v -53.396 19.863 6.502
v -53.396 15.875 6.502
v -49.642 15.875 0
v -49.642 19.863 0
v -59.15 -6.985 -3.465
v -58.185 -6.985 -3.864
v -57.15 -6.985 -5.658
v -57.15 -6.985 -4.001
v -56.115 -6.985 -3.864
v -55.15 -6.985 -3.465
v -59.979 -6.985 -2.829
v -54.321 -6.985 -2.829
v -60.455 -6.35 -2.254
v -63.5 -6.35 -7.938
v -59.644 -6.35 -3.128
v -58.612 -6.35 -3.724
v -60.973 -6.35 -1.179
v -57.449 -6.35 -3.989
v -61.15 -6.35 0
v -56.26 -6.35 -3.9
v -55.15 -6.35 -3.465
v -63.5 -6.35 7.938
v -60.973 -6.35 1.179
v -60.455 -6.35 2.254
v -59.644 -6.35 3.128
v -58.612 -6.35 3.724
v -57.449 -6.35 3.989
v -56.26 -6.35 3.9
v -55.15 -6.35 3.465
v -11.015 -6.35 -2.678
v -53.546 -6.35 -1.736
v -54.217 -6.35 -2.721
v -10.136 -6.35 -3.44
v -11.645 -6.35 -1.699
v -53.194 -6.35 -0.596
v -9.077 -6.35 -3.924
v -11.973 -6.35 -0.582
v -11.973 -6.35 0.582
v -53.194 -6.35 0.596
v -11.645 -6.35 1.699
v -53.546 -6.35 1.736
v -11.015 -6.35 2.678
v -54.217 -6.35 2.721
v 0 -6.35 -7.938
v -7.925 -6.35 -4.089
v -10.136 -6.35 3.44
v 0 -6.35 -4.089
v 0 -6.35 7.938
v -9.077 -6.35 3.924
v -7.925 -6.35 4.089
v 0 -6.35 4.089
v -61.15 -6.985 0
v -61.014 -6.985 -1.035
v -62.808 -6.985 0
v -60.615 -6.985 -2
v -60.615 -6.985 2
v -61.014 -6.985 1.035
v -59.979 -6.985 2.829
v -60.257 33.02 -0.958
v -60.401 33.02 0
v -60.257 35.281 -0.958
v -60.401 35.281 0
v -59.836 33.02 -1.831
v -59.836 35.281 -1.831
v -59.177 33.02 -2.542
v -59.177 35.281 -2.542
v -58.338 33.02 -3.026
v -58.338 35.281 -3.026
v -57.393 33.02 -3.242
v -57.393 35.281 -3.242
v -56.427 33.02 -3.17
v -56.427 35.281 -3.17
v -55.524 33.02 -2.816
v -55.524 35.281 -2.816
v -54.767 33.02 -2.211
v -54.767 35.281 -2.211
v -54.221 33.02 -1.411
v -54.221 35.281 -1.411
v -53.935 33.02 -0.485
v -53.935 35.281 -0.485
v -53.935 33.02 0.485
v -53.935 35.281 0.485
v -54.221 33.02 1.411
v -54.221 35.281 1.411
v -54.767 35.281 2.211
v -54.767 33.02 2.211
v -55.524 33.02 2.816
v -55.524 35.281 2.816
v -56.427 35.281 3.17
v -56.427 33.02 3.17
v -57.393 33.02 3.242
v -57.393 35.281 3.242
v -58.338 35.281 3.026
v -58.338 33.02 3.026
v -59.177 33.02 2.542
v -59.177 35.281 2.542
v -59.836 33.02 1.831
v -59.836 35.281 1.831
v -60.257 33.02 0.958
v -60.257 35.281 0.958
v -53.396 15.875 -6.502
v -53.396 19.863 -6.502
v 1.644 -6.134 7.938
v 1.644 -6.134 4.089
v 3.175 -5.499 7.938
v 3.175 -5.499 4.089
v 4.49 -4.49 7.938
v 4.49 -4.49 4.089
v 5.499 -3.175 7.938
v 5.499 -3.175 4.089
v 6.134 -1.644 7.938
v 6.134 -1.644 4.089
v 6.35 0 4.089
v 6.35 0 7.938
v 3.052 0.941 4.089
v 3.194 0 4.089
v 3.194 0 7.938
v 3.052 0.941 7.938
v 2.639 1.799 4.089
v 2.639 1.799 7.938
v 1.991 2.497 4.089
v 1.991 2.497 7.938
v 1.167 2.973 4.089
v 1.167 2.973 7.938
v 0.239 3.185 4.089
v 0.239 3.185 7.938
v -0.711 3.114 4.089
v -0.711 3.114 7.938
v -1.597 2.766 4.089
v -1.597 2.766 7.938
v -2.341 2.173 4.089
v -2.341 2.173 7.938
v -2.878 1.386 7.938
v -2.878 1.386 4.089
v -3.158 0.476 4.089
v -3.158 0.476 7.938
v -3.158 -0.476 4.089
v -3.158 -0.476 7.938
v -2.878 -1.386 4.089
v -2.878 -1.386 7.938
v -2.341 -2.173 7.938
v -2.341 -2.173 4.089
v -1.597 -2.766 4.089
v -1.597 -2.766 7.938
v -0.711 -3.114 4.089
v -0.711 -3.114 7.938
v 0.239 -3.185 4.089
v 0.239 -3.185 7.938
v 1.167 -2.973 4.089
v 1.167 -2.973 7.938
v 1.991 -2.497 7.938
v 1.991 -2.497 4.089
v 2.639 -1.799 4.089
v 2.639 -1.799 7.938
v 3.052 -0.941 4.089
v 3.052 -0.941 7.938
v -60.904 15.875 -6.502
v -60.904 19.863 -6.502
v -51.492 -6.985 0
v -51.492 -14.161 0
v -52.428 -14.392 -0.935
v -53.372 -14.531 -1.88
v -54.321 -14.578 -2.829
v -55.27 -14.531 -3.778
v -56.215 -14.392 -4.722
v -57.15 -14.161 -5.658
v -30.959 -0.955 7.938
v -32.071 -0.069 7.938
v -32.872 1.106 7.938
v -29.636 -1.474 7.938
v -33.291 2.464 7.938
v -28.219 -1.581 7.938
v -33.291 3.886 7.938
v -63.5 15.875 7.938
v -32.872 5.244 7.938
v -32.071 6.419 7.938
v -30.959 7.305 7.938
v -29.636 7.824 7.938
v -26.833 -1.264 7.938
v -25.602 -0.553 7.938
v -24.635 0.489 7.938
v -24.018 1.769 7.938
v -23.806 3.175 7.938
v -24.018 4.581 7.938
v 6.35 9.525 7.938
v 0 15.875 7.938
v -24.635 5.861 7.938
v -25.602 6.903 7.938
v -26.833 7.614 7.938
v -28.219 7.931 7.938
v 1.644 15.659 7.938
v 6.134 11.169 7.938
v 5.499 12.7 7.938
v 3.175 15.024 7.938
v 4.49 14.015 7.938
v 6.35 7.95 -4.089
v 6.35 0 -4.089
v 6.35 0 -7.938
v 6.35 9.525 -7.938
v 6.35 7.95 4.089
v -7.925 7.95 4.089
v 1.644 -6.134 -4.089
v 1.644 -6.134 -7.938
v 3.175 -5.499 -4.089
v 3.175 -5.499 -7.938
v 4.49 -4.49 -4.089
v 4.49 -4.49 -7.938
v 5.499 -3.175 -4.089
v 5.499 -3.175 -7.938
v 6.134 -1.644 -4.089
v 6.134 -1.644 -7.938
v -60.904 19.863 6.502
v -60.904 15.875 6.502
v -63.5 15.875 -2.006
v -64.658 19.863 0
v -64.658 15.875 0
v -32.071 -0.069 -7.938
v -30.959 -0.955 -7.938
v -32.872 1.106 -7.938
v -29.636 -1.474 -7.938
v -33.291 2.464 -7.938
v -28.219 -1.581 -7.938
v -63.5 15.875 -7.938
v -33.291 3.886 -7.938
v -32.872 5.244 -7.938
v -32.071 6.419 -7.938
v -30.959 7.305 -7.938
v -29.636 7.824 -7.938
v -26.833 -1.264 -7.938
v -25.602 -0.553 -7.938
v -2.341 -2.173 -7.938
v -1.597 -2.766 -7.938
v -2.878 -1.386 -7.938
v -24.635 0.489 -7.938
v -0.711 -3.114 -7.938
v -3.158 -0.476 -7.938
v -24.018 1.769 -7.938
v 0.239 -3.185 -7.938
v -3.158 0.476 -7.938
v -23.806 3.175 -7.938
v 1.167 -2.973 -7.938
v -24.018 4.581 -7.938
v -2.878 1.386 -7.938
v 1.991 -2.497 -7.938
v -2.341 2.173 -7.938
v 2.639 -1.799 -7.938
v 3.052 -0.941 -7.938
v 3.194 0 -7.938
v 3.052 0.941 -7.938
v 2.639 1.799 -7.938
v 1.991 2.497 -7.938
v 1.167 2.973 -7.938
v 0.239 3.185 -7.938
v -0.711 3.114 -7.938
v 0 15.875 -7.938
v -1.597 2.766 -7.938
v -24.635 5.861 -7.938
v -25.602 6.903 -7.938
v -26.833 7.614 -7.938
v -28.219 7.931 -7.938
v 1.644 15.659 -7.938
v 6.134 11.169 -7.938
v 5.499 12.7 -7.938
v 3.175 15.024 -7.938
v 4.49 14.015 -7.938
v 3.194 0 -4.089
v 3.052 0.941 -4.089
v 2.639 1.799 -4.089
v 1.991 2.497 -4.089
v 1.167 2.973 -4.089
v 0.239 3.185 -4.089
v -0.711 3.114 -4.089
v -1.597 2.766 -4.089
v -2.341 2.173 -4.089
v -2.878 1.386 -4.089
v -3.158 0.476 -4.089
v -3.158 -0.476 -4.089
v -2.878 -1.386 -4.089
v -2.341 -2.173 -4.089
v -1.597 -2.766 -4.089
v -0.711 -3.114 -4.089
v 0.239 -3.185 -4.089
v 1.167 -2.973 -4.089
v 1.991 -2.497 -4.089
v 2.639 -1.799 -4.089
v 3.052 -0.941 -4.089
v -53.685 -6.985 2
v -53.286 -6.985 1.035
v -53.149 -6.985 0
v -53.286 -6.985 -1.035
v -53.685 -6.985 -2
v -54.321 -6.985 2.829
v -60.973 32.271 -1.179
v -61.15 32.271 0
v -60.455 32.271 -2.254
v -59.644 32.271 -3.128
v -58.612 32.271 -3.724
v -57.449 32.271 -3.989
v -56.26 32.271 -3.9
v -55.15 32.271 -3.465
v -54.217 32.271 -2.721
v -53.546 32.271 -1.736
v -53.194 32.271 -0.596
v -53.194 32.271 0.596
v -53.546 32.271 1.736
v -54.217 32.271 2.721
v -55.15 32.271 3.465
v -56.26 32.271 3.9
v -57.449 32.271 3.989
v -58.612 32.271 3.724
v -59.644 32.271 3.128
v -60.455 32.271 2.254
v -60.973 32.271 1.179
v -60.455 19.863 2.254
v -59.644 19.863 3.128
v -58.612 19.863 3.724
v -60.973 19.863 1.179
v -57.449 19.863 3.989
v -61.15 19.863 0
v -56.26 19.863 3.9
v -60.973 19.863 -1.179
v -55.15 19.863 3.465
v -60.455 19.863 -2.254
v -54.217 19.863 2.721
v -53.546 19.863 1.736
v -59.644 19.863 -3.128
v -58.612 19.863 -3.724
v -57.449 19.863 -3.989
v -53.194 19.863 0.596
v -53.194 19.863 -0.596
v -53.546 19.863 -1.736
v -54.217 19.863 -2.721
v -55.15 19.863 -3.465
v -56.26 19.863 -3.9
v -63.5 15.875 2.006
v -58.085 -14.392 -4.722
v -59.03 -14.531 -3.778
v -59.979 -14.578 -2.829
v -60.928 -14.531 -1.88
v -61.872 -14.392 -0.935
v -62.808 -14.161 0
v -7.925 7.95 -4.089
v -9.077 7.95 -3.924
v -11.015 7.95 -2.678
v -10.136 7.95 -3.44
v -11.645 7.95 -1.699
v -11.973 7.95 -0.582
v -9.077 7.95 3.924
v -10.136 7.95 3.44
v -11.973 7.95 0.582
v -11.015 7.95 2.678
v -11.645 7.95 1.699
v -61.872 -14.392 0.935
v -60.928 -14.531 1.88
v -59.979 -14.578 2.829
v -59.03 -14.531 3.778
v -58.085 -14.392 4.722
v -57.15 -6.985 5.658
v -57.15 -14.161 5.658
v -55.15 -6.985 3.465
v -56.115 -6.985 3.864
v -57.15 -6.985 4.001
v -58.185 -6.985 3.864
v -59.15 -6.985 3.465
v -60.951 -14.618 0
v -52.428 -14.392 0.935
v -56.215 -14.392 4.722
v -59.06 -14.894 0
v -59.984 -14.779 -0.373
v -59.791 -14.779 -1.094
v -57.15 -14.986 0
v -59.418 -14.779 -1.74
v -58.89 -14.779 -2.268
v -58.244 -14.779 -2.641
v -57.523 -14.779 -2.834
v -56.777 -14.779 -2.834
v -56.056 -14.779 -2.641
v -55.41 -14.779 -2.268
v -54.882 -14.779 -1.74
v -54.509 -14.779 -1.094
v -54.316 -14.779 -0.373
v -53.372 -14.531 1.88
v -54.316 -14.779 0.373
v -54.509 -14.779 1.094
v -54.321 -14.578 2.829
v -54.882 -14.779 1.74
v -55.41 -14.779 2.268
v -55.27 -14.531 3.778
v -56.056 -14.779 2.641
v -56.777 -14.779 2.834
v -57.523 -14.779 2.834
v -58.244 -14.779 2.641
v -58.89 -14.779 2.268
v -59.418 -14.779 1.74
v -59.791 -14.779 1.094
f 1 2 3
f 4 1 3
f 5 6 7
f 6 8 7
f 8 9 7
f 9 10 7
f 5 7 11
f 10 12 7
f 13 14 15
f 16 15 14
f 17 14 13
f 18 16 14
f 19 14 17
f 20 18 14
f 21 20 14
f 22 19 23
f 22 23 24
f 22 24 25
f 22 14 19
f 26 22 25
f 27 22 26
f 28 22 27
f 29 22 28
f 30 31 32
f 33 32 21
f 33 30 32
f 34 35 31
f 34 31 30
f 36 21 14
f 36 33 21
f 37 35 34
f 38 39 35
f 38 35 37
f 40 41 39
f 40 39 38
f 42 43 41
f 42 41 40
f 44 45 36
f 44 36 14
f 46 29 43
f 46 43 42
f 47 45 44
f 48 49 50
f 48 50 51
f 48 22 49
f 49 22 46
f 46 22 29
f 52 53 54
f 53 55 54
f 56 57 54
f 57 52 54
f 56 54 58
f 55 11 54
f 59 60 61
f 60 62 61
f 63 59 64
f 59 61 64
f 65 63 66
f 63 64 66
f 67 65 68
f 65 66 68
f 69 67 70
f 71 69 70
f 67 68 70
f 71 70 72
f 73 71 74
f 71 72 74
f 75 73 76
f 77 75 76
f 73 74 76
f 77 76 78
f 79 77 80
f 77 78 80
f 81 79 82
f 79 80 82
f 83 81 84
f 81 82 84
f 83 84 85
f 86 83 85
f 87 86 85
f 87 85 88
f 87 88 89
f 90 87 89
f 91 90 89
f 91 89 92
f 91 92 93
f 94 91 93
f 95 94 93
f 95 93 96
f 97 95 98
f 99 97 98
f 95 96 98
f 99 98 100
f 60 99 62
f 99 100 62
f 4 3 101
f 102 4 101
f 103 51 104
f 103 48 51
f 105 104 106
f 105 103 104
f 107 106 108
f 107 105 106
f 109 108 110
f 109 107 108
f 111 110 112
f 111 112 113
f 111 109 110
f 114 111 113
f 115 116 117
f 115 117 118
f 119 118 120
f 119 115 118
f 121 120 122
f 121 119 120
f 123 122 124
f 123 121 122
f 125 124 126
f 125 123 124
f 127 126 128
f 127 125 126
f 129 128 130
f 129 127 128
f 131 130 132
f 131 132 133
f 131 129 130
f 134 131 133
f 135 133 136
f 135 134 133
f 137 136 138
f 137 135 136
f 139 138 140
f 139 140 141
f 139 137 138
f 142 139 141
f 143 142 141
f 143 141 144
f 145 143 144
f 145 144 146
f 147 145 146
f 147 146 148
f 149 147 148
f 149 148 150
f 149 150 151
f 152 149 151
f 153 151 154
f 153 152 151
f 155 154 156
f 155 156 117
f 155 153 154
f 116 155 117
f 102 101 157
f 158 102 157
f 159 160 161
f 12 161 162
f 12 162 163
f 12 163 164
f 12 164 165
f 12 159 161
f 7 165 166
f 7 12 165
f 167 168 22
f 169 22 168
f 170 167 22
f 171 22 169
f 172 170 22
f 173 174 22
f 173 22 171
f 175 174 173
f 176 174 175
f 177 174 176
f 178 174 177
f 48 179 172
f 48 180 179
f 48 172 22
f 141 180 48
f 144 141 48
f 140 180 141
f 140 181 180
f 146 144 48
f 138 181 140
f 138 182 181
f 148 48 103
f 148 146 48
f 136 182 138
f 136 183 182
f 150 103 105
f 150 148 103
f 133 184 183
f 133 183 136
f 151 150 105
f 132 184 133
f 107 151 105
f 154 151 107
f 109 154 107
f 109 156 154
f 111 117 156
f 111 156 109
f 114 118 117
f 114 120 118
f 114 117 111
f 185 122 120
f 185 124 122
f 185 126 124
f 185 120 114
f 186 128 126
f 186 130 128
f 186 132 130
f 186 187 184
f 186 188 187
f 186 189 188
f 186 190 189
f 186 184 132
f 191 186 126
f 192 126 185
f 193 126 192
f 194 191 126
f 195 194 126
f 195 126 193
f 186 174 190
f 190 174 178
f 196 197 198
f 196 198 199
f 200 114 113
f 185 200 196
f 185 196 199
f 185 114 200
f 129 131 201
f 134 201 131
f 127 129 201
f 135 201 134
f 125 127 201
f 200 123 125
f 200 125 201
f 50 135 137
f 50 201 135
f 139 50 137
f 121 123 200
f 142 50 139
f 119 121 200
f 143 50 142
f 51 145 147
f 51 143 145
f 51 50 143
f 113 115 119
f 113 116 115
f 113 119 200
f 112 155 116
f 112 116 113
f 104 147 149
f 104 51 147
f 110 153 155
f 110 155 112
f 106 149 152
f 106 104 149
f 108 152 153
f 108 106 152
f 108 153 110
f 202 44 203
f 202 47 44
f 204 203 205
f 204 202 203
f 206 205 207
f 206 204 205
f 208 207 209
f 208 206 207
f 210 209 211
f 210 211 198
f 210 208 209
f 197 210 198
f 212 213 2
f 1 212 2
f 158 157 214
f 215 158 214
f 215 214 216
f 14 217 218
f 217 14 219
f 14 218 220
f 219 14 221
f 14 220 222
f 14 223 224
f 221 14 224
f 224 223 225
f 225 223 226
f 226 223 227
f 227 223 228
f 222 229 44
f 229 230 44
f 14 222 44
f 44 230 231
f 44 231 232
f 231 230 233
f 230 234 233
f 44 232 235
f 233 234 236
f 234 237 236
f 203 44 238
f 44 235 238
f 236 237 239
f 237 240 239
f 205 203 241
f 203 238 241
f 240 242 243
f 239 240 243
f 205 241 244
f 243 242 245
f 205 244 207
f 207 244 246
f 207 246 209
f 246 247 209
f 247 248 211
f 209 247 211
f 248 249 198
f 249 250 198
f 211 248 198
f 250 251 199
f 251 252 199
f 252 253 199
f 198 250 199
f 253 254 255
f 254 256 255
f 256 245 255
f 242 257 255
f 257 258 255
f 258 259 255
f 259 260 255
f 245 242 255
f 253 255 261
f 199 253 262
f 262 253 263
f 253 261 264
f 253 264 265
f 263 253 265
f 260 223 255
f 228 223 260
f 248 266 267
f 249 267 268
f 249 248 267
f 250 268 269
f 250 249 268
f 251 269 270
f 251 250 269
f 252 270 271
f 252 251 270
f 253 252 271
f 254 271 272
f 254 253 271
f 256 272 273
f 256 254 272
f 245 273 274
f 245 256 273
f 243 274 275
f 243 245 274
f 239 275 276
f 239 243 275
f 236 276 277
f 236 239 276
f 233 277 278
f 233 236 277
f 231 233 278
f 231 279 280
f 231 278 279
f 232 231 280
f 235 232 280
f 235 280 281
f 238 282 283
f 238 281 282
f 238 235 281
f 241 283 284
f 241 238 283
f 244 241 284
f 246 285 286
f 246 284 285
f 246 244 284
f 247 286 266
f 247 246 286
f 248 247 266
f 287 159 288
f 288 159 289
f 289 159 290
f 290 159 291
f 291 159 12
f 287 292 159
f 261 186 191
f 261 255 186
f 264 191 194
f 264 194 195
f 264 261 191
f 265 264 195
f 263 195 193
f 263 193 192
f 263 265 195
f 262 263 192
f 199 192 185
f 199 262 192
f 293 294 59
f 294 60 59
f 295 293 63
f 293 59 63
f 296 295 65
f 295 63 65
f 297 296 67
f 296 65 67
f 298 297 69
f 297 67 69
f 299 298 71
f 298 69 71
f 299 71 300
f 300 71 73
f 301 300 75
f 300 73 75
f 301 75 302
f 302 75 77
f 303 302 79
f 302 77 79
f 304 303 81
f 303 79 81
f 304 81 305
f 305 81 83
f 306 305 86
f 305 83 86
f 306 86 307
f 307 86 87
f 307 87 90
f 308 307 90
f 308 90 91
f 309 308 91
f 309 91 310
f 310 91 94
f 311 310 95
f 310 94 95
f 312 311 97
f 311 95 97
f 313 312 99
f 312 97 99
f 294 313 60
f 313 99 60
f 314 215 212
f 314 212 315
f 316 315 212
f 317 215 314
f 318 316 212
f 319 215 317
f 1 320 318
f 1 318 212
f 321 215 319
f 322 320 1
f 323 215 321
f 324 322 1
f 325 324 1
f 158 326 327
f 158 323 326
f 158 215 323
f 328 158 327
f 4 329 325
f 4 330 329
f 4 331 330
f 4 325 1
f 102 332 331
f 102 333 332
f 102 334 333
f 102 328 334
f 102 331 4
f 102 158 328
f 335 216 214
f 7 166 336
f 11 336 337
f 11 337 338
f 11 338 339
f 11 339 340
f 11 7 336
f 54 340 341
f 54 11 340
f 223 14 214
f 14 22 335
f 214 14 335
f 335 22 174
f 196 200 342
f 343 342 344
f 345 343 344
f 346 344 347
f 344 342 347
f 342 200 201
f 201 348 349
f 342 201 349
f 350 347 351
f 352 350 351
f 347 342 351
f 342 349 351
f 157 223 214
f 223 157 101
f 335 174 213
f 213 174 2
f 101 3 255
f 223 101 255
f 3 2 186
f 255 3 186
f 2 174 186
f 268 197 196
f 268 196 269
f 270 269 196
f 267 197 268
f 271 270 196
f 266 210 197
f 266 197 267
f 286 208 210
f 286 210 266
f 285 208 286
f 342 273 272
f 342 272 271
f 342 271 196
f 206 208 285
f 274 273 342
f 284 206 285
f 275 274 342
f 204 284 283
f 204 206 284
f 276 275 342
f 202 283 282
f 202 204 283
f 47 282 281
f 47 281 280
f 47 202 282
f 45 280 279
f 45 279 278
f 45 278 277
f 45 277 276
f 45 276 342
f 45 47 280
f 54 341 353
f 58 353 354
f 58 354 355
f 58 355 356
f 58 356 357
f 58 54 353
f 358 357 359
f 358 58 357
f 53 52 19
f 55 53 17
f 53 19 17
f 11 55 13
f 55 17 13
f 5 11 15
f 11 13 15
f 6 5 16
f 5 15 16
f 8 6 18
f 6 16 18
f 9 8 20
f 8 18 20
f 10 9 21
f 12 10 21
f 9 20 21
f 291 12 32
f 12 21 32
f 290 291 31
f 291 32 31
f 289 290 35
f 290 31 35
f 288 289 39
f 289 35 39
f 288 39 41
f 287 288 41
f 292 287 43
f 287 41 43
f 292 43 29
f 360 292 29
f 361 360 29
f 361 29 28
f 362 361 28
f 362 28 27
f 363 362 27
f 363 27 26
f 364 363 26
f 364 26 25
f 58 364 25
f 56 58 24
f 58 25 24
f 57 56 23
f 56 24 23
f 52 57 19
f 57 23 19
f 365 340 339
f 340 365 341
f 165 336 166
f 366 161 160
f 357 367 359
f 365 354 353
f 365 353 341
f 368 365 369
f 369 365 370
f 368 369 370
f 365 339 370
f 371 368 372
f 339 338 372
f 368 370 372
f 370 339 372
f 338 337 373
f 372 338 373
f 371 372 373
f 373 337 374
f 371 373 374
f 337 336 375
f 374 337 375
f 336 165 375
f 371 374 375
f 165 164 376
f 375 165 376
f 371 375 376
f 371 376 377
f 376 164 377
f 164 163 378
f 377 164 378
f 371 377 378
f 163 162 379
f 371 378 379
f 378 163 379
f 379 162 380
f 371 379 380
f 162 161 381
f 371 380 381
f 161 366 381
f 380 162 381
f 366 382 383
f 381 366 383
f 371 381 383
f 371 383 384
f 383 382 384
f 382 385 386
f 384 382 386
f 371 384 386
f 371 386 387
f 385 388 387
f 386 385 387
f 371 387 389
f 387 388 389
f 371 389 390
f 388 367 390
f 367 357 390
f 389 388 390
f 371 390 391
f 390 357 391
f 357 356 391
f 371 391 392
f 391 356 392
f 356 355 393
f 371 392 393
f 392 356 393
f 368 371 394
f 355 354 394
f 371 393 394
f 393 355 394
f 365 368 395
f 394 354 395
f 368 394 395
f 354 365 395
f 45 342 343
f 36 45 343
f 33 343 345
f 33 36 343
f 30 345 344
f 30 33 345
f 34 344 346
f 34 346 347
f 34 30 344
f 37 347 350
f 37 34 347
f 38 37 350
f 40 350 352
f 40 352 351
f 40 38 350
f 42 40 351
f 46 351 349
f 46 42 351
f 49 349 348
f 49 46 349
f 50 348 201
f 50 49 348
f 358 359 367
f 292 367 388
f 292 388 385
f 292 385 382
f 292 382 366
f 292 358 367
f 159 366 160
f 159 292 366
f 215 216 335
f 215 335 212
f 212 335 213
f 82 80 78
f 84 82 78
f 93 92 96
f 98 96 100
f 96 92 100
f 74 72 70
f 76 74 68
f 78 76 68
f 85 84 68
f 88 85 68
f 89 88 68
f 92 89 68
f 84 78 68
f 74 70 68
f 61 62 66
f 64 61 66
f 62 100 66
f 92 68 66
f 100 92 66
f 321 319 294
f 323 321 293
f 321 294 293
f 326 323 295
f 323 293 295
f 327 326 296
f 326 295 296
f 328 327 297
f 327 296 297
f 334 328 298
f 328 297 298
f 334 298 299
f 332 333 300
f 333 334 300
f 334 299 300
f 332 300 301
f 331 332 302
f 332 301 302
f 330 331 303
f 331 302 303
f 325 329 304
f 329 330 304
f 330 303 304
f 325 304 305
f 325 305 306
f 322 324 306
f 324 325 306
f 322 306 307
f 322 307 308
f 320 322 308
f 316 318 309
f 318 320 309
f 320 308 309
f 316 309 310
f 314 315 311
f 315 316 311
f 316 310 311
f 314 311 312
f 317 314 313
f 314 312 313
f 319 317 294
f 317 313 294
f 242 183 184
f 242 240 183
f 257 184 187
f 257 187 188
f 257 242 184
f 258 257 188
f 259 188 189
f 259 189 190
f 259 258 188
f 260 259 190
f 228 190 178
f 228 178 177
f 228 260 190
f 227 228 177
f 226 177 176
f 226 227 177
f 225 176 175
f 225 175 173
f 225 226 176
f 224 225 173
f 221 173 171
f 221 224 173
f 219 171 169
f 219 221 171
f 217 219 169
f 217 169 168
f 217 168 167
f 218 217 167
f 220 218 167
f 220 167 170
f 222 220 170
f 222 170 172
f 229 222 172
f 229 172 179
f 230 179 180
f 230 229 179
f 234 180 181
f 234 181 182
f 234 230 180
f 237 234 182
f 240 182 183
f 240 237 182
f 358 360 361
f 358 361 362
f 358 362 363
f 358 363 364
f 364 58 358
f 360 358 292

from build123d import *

# Parameters (mm, degrees)
SKETCH11_W         = 69.85
SKETCH11_H         = 22.225
SKETCH11_R         = 3.19405
SKETCH11_R_2       = 4.76885
EXTRUDE3_DEPTH     = 7.9375
CUT_EXTRUDE1_DEPTH = 14.3002
FILLET1_R          = 6.35
EXTRUDE4_DEPTH     = 3.9878
SKETCH15_R         = 15.311270849
CUT_EXTRUDE2_DEPTH = 9.001


with BuildPart() as part:
    # Sketch11 → Extrude3 (new body, symmetric)
    with BuildSketch(Plane.XY):
        with Locations((-28.575, 4.7625)):
            Rectangle(SKETCH11_W, SKETCH11_H)
        Circle(SKETCH11_R, mode=Mode.SUBTRACT)
        with Locations((-28.575, 3.175)):
            Circle(SKETCH11_R_2, mode=Mode.SUBTRACT)
    extrude(amount=EXTRUDE3_DEPTH, both=True)

    # Sketch12 → Cut-Extrude1 (cut)
    with BuildSketch(Plane.XZ.offset(6.35)):
        with BuildLine():
            Line((-7.9248, 4.0894), (6.35, 4.0894))
            Line((6.35, 4.0894), (6.35, -4.0894))
            Line((6.35, -4.0894), (-7.9248, -4.0894))
            ThreePointArc((-7.9248, -4.0894), (-12.0142, 0), (-7.9248, 4.0894))
        make_face()
    extrude(amount=-CUT_EXTRUDE1_DEPTH, mode=Mode.SUBTRACT)

    # Fillet1
    fillet1_edges = [part.edges().sort_by_distance(p)[0] for p in [
        (6.35, -6.35, -6.01345),
        (6.35, 15.875, 0),
        (6.35, -6.35, 6.01345),
    ]]
    fillet(fillet1_edges, radius=FILLET1_R)

    # Sketch13 → Extrude4 (add)
    with BuildSketch(Plane(origin=(0, 15.875, 0), x_dir=(1, 0, 0), z_dir=(0, 1, 0))):
        Polygon((-49.641675219, 0), (-53.39583761, 6.5024), (-60.90416239, 6.5024), (-64.658324781, 0), (-60.90416239, -6.5024), (-53.39583761, -6.5024), align=None)
    extrude(amount=EXTRUDE4_DEPTH)

    # Sketch14 → Revolve2 (revolve)
    with BuildSketch(Plane.XY):
        with BuildLine():
            Line((-60.4012, 33.02), (-60.4012, 35.2806))
            Line((-60.4012, 35.2806), (-57.15, 35.2806))
            Line((-57.15, 35.2806), (-57.15, -14.986))
            ThreePointArc((-57.15, -14.986), (-65.618148204, -13.085052733), (-72.461270849, -7.747))
            Line((-72.461270849, -7.747), (-72.461270849, -6.985))
            Line((-72.461270849, -6.985), (-61.1505, -6.985))
            Line((-61.1505, -6.985), (-61.1505, 32.2707))
            Line((-61.1505, 32.2707), (-60.4012, 33.02))
        make_face()
    revolve(axis=Axis((-57.15, 48.481677569, 0), (0, -1, 0)))

    # Sketch15 → Cut-Extrude2 (cut, through all)
    with BuildSketch(Plane(origin=(0, -6.985, 0), x_dir=(1, 0, 0), z_dir=(0, 1, 0))):
        with Locations((-57.15, 0)):
            Circle(SKETCH15_R)
        Polygon((-57.15, 5.657561356), (-62.807561356, 0), (-57.15, -5.657561356), (-51.492438644, 0), align=None, mode=Mode.SUBTRACT)
    extrude(amount=-CUT_EXTRUDE2_DEPTH, mode=Mode.SUBTRACT)


solid = part.part
